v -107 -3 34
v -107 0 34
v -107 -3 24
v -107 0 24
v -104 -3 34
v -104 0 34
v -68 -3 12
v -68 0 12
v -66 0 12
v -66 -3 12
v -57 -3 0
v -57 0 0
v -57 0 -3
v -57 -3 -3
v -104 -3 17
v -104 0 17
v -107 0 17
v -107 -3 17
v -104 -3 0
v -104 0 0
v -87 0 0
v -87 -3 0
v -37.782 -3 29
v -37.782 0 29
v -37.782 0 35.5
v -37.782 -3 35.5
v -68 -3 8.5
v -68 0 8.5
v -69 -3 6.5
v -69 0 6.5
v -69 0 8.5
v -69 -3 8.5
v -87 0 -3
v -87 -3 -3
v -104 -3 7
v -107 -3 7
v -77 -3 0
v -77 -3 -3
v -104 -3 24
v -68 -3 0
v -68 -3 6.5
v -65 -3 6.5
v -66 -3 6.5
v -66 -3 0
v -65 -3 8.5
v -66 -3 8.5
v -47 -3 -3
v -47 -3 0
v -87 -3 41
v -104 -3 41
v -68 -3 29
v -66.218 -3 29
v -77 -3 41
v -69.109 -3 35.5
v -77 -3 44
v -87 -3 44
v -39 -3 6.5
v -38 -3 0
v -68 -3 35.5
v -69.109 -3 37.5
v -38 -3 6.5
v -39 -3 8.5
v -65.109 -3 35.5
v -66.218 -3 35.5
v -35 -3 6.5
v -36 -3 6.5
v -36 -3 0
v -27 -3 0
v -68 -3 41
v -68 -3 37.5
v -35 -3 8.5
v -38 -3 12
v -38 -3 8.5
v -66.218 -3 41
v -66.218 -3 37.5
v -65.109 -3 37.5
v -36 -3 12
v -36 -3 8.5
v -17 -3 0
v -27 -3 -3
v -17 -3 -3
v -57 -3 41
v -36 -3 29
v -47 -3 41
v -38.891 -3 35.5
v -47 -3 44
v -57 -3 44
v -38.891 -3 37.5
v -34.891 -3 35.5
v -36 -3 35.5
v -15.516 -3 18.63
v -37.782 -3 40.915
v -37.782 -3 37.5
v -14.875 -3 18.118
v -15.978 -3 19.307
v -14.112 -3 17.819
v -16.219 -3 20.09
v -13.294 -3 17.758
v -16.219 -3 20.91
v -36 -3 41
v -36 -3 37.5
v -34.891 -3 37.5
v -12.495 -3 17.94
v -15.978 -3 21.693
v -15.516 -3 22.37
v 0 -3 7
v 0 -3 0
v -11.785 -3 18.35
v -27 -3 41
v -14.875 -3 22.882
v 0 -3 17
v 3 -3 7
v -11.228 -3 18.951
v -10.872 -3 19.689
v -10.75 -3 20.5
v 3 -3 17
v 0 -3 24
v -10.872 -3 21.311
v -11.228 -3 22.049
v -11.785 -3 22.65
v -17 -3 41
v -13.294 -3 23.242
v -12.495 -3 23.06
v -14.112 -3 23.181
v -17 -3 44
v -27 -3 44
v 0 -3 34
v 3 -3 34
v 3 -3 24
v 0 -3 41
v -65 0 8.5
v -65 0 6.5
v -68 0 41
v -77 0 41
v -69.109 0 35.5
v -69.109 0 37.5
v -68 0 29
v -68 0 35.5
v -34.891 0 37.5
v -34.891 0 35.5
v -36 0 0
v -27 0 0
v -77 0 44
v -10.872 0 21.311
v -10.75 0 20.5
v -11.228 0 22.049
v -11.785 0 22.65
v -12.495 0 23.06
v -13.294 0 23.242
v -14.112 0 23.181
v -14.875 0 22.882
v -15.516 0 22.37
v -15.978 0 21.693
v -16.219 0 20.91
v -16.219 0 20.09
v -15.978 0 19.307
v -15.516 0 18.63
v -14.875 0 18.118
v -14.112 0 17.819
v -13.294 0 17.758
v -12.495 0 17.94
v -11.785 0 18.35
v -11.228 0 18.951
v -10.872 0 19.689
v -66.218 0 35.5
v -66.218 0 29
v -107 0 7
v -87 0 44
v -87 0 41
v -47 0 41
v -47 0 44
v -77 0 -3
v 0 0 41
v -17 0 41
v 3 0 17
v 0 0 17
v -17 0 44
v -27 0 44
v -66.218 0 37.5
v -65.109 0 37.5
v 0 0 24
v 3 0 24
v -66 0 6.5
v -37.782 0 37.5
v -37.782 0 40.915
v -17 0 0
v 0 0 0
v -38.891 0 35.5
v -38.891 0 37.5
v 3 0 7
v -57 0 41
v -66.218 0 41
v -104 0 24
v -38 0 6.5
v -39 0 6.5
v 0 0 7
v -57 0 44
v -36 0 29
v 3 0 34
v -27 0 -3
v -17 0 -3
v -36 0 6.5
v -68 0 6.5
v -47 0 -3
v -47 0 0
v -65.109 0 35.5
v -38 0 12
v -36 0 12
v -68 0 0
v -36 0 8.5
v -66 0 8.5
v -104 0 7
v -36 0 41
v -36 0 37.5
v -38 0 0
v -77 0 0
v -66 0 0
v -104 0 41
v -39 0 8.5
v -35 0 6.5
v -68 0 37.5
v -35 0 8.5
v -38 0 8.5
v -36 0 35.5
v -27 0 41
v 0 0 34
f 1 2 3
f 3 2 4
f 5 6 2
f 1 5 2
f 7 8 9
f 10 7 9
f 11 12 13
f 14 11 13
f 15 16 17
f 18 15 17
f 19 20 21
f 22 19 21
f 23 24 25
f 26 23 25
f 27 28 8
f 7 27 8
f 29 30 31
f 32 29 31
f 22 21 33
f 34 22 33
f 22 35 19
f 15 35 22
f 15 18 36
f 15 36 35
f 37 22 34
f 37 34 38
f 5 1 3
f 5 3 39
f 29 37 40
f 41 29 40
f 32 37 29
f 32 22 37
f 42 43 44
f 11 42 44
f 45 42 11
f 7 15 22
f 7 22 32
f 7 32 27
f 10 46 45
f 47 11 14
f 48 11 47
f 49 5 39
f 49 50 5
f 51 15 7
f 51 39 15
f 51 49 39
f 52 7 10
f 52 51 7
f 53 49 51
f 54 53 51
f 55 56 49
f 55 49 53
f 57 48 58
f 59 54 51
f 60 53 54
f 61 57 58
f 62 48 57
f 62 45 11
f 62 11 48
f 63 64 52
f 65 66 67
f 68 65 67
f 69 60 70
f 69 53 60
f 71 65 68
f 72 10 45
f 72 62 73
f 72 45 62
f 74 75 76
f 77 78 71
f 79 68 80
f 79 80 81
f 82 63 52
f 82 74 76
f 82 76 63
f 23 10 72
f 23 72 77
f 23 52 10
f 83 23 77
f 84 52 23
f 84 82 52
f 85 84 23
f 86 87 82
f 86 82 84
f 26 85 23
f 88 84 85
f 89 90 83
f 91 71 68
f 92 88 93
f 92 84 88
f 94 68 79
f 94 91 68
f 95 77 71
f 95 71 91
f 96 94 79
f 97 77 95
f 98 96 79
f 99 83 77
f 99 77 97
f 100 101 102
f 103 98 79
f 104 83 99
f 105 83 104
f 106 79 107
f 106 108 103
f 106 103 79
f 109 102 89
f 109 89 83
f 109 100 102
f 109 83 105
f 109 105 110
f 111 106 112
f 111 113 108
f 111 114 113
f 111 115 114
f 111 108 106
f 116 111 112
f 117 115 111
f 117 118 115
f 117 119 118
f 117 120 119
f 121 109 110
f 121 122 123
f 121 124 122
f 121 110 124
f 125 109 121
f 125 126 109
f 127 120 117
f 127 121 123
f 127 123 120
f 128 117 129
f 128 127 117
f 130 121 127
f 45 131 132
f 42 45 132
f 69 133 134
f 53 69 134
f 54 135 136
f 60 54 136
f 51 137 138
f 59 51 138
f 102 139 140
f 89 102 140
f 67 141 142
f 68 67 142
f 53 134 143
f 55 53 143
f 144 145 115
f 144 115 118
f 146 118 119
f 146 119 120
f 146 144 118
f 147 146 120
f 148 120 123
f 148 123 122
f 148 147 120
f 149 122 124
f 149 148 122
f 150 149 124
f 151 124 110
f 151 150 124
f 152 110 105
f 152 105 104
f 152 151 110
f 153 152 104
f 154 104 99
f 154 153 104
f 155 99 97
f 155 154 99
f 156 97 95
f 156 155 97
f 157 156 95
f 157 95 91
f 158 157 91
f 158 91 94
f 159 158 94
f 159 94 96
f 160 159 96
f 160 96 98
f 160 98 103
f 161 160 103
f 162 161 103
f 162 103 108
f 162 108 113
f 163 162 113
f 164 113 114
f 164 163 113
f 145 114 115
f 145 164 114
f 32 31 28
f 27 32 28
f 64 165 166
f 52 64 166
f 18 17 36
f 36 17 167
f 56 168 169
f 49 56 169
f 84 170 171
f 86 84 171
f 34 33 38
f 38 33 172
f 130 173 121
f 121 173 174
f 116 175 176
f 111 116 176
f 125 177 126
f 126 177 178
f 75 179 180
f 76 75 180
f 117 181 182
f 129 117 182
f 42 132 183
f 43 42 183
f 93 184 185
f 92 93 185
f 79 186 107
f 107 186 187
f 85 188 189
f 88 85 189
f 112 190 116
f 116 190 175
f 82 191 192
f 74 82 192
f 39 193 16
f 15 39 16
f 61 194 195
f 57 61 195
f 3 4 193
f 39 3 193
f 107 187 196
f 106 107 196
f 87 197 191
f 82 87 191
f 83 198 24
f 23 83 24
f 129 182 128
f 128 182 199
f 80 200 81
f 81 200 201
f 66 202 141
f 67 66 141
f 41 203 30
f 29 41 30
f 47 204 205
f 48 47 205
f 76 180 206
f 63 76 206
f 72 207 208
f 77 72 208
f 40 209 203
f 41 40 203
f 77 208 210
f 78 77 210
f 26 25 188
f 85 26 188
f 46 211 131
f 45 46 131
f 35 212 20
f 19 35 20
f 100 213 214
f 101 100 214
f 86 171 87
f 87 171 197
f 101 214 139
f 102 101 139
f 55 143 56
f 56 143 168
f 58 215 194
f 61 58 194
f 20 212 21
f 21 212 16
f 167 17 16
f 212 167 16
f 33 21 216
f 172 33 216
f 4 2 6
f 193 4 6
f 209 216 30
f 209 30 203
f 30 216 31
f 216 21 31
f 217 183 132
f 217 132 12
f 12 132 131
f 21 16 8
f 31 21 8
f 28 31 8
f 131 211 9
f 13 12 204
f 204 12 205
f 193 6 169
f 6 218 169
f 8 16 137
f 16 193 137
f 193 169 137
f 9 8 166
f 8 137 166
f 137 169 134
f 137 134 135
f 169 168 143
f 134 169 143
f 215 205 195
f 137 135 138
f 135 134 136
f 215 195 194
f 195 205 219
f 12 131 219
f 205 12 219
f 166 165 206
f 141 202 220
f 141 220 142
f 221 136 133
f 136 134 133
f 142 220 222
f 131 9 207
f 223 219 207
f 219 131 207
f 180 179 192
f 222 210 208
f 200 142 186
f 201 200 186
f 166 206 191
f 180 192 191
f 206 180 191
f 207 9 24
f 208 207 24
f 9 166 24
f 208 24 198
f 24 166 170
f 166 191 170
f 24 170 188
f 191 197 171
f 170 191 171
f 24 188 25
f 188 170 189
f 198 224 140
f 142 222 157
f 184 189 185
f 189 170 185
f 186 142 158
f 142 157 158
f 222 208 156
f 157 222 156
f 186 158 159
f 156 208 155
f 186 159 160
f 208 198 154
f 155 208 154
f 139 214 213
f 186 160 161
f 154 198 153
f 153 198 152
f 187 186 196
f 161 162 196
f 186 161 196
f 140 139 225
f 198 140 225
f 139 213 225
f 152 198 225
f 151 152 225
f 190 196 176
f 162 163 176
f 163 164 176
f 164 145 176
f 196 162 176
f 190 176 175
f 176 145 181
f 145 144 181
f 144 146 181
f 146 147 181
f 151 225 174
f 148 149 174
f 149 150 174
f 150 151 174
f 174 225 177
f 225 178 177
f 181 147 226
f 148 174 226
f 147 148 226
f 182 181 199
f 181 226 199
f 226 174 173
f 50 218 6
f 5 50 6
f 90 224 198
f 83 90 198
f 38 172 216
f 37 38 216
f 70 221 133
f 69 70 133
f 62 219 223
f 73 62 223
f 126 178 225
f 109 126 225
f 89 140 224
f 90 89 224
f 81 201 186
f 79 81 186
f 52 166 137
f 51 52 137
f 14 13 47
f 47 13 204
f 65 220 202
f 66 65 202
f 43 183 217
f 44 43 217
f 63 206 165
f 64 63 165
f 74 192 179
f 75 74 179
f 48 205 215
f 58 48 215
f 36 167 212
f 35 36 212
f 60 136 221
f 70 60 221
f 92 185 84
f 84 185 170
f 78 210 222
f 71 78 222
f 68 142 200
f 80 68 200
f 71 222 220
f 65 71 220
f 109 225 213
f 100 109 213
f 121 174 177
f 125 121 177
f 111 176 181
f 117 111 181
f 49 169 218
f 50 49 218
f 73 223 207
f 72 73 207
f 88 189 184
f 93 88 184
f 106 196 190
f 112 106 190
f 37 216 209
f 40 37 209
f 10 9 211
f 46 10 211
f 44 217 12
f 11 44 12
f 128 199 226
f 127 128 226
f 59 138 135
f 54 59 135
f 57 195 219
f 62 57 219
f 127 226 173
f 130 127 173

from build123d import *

# Parameters (mm, degrees)
F0_R     = 2.75
F1_DEPTH = 3


with BuildPart() as f1:
    # F0 (on Front) → F1 (new body)
    with BuildSketch(Plane.XZ):
        Polygon((-17, 0), (0, 0), (0, 7), (3, 7), (3, 17), (0, 17), (0, 24), (3, 24), (3, 34), (0, 34), (0, 41), (-17, 41), (-17, 44), (-27, 44), (-27, 41), (-36, 41), (-36, 37.5), (-34.891142, 37.5), (-34.891142, 35.5), (-36, 35.5), (-36, 29), (-37.782284, 29), (-37.782284, 35.5), (-38.891142, 35.5), (-38.891142, 37.5), (-37.782284, 37.5), (-37.782284, 40.915333), (-47, 41), (-47, 44), (-57, 44), (-57, 41), (-66.217716, 41), (-66.217716, 37.5), (-65.108858, 37.5), (-65.108858, 35.5), (-66.217716, 35.5), (-66.217716, 29), (-68, 29), (-68, 35.5), (-69.108858, 35.5), (-69.108858, 37.5), (-68, 37.5), (-68, 41), (-77, 41), (-77, 44), (-87, 44), (-87, 41), (-104, 41), (-104, 34), (-107, 34), (-107, 24), (-104, 24), (-104, 17), (-107, 17), (-107, 7), (-104, 7), (-104, 0), (-87, 0), (-87, -3), (-77, -3), (-77, 0), (-68, 0), (-68, 6.5), (-69, 6.5), (-69, 8.5), (-68, 8.5), (-68, 12), (-66, 12), (-66, 8.5), (-65, 8.5), (-65, 6.5), (-66, 6.5), (-66, 0), (-57, 0), (-57, -3), (-47, -3), (-47, 0), (-38, 0), (-38, 6.5), (-39, 6.5), (-39, 8.5), (-38, 8.5), (-38, 12), (-36, 12), (-36, 8.5), (-35, 8.5), (-35, 6.5), (-36, 6.5), (-36, 0), (-27, 0), (-27, -3), (-17, -3), align=None)
        with Locations((-13.5, 20.5)):
            Circle(F0_R, mode=Mode.SUBTRACT)
    extrude(amount=F1_DEPTH)


solid = f1.part
